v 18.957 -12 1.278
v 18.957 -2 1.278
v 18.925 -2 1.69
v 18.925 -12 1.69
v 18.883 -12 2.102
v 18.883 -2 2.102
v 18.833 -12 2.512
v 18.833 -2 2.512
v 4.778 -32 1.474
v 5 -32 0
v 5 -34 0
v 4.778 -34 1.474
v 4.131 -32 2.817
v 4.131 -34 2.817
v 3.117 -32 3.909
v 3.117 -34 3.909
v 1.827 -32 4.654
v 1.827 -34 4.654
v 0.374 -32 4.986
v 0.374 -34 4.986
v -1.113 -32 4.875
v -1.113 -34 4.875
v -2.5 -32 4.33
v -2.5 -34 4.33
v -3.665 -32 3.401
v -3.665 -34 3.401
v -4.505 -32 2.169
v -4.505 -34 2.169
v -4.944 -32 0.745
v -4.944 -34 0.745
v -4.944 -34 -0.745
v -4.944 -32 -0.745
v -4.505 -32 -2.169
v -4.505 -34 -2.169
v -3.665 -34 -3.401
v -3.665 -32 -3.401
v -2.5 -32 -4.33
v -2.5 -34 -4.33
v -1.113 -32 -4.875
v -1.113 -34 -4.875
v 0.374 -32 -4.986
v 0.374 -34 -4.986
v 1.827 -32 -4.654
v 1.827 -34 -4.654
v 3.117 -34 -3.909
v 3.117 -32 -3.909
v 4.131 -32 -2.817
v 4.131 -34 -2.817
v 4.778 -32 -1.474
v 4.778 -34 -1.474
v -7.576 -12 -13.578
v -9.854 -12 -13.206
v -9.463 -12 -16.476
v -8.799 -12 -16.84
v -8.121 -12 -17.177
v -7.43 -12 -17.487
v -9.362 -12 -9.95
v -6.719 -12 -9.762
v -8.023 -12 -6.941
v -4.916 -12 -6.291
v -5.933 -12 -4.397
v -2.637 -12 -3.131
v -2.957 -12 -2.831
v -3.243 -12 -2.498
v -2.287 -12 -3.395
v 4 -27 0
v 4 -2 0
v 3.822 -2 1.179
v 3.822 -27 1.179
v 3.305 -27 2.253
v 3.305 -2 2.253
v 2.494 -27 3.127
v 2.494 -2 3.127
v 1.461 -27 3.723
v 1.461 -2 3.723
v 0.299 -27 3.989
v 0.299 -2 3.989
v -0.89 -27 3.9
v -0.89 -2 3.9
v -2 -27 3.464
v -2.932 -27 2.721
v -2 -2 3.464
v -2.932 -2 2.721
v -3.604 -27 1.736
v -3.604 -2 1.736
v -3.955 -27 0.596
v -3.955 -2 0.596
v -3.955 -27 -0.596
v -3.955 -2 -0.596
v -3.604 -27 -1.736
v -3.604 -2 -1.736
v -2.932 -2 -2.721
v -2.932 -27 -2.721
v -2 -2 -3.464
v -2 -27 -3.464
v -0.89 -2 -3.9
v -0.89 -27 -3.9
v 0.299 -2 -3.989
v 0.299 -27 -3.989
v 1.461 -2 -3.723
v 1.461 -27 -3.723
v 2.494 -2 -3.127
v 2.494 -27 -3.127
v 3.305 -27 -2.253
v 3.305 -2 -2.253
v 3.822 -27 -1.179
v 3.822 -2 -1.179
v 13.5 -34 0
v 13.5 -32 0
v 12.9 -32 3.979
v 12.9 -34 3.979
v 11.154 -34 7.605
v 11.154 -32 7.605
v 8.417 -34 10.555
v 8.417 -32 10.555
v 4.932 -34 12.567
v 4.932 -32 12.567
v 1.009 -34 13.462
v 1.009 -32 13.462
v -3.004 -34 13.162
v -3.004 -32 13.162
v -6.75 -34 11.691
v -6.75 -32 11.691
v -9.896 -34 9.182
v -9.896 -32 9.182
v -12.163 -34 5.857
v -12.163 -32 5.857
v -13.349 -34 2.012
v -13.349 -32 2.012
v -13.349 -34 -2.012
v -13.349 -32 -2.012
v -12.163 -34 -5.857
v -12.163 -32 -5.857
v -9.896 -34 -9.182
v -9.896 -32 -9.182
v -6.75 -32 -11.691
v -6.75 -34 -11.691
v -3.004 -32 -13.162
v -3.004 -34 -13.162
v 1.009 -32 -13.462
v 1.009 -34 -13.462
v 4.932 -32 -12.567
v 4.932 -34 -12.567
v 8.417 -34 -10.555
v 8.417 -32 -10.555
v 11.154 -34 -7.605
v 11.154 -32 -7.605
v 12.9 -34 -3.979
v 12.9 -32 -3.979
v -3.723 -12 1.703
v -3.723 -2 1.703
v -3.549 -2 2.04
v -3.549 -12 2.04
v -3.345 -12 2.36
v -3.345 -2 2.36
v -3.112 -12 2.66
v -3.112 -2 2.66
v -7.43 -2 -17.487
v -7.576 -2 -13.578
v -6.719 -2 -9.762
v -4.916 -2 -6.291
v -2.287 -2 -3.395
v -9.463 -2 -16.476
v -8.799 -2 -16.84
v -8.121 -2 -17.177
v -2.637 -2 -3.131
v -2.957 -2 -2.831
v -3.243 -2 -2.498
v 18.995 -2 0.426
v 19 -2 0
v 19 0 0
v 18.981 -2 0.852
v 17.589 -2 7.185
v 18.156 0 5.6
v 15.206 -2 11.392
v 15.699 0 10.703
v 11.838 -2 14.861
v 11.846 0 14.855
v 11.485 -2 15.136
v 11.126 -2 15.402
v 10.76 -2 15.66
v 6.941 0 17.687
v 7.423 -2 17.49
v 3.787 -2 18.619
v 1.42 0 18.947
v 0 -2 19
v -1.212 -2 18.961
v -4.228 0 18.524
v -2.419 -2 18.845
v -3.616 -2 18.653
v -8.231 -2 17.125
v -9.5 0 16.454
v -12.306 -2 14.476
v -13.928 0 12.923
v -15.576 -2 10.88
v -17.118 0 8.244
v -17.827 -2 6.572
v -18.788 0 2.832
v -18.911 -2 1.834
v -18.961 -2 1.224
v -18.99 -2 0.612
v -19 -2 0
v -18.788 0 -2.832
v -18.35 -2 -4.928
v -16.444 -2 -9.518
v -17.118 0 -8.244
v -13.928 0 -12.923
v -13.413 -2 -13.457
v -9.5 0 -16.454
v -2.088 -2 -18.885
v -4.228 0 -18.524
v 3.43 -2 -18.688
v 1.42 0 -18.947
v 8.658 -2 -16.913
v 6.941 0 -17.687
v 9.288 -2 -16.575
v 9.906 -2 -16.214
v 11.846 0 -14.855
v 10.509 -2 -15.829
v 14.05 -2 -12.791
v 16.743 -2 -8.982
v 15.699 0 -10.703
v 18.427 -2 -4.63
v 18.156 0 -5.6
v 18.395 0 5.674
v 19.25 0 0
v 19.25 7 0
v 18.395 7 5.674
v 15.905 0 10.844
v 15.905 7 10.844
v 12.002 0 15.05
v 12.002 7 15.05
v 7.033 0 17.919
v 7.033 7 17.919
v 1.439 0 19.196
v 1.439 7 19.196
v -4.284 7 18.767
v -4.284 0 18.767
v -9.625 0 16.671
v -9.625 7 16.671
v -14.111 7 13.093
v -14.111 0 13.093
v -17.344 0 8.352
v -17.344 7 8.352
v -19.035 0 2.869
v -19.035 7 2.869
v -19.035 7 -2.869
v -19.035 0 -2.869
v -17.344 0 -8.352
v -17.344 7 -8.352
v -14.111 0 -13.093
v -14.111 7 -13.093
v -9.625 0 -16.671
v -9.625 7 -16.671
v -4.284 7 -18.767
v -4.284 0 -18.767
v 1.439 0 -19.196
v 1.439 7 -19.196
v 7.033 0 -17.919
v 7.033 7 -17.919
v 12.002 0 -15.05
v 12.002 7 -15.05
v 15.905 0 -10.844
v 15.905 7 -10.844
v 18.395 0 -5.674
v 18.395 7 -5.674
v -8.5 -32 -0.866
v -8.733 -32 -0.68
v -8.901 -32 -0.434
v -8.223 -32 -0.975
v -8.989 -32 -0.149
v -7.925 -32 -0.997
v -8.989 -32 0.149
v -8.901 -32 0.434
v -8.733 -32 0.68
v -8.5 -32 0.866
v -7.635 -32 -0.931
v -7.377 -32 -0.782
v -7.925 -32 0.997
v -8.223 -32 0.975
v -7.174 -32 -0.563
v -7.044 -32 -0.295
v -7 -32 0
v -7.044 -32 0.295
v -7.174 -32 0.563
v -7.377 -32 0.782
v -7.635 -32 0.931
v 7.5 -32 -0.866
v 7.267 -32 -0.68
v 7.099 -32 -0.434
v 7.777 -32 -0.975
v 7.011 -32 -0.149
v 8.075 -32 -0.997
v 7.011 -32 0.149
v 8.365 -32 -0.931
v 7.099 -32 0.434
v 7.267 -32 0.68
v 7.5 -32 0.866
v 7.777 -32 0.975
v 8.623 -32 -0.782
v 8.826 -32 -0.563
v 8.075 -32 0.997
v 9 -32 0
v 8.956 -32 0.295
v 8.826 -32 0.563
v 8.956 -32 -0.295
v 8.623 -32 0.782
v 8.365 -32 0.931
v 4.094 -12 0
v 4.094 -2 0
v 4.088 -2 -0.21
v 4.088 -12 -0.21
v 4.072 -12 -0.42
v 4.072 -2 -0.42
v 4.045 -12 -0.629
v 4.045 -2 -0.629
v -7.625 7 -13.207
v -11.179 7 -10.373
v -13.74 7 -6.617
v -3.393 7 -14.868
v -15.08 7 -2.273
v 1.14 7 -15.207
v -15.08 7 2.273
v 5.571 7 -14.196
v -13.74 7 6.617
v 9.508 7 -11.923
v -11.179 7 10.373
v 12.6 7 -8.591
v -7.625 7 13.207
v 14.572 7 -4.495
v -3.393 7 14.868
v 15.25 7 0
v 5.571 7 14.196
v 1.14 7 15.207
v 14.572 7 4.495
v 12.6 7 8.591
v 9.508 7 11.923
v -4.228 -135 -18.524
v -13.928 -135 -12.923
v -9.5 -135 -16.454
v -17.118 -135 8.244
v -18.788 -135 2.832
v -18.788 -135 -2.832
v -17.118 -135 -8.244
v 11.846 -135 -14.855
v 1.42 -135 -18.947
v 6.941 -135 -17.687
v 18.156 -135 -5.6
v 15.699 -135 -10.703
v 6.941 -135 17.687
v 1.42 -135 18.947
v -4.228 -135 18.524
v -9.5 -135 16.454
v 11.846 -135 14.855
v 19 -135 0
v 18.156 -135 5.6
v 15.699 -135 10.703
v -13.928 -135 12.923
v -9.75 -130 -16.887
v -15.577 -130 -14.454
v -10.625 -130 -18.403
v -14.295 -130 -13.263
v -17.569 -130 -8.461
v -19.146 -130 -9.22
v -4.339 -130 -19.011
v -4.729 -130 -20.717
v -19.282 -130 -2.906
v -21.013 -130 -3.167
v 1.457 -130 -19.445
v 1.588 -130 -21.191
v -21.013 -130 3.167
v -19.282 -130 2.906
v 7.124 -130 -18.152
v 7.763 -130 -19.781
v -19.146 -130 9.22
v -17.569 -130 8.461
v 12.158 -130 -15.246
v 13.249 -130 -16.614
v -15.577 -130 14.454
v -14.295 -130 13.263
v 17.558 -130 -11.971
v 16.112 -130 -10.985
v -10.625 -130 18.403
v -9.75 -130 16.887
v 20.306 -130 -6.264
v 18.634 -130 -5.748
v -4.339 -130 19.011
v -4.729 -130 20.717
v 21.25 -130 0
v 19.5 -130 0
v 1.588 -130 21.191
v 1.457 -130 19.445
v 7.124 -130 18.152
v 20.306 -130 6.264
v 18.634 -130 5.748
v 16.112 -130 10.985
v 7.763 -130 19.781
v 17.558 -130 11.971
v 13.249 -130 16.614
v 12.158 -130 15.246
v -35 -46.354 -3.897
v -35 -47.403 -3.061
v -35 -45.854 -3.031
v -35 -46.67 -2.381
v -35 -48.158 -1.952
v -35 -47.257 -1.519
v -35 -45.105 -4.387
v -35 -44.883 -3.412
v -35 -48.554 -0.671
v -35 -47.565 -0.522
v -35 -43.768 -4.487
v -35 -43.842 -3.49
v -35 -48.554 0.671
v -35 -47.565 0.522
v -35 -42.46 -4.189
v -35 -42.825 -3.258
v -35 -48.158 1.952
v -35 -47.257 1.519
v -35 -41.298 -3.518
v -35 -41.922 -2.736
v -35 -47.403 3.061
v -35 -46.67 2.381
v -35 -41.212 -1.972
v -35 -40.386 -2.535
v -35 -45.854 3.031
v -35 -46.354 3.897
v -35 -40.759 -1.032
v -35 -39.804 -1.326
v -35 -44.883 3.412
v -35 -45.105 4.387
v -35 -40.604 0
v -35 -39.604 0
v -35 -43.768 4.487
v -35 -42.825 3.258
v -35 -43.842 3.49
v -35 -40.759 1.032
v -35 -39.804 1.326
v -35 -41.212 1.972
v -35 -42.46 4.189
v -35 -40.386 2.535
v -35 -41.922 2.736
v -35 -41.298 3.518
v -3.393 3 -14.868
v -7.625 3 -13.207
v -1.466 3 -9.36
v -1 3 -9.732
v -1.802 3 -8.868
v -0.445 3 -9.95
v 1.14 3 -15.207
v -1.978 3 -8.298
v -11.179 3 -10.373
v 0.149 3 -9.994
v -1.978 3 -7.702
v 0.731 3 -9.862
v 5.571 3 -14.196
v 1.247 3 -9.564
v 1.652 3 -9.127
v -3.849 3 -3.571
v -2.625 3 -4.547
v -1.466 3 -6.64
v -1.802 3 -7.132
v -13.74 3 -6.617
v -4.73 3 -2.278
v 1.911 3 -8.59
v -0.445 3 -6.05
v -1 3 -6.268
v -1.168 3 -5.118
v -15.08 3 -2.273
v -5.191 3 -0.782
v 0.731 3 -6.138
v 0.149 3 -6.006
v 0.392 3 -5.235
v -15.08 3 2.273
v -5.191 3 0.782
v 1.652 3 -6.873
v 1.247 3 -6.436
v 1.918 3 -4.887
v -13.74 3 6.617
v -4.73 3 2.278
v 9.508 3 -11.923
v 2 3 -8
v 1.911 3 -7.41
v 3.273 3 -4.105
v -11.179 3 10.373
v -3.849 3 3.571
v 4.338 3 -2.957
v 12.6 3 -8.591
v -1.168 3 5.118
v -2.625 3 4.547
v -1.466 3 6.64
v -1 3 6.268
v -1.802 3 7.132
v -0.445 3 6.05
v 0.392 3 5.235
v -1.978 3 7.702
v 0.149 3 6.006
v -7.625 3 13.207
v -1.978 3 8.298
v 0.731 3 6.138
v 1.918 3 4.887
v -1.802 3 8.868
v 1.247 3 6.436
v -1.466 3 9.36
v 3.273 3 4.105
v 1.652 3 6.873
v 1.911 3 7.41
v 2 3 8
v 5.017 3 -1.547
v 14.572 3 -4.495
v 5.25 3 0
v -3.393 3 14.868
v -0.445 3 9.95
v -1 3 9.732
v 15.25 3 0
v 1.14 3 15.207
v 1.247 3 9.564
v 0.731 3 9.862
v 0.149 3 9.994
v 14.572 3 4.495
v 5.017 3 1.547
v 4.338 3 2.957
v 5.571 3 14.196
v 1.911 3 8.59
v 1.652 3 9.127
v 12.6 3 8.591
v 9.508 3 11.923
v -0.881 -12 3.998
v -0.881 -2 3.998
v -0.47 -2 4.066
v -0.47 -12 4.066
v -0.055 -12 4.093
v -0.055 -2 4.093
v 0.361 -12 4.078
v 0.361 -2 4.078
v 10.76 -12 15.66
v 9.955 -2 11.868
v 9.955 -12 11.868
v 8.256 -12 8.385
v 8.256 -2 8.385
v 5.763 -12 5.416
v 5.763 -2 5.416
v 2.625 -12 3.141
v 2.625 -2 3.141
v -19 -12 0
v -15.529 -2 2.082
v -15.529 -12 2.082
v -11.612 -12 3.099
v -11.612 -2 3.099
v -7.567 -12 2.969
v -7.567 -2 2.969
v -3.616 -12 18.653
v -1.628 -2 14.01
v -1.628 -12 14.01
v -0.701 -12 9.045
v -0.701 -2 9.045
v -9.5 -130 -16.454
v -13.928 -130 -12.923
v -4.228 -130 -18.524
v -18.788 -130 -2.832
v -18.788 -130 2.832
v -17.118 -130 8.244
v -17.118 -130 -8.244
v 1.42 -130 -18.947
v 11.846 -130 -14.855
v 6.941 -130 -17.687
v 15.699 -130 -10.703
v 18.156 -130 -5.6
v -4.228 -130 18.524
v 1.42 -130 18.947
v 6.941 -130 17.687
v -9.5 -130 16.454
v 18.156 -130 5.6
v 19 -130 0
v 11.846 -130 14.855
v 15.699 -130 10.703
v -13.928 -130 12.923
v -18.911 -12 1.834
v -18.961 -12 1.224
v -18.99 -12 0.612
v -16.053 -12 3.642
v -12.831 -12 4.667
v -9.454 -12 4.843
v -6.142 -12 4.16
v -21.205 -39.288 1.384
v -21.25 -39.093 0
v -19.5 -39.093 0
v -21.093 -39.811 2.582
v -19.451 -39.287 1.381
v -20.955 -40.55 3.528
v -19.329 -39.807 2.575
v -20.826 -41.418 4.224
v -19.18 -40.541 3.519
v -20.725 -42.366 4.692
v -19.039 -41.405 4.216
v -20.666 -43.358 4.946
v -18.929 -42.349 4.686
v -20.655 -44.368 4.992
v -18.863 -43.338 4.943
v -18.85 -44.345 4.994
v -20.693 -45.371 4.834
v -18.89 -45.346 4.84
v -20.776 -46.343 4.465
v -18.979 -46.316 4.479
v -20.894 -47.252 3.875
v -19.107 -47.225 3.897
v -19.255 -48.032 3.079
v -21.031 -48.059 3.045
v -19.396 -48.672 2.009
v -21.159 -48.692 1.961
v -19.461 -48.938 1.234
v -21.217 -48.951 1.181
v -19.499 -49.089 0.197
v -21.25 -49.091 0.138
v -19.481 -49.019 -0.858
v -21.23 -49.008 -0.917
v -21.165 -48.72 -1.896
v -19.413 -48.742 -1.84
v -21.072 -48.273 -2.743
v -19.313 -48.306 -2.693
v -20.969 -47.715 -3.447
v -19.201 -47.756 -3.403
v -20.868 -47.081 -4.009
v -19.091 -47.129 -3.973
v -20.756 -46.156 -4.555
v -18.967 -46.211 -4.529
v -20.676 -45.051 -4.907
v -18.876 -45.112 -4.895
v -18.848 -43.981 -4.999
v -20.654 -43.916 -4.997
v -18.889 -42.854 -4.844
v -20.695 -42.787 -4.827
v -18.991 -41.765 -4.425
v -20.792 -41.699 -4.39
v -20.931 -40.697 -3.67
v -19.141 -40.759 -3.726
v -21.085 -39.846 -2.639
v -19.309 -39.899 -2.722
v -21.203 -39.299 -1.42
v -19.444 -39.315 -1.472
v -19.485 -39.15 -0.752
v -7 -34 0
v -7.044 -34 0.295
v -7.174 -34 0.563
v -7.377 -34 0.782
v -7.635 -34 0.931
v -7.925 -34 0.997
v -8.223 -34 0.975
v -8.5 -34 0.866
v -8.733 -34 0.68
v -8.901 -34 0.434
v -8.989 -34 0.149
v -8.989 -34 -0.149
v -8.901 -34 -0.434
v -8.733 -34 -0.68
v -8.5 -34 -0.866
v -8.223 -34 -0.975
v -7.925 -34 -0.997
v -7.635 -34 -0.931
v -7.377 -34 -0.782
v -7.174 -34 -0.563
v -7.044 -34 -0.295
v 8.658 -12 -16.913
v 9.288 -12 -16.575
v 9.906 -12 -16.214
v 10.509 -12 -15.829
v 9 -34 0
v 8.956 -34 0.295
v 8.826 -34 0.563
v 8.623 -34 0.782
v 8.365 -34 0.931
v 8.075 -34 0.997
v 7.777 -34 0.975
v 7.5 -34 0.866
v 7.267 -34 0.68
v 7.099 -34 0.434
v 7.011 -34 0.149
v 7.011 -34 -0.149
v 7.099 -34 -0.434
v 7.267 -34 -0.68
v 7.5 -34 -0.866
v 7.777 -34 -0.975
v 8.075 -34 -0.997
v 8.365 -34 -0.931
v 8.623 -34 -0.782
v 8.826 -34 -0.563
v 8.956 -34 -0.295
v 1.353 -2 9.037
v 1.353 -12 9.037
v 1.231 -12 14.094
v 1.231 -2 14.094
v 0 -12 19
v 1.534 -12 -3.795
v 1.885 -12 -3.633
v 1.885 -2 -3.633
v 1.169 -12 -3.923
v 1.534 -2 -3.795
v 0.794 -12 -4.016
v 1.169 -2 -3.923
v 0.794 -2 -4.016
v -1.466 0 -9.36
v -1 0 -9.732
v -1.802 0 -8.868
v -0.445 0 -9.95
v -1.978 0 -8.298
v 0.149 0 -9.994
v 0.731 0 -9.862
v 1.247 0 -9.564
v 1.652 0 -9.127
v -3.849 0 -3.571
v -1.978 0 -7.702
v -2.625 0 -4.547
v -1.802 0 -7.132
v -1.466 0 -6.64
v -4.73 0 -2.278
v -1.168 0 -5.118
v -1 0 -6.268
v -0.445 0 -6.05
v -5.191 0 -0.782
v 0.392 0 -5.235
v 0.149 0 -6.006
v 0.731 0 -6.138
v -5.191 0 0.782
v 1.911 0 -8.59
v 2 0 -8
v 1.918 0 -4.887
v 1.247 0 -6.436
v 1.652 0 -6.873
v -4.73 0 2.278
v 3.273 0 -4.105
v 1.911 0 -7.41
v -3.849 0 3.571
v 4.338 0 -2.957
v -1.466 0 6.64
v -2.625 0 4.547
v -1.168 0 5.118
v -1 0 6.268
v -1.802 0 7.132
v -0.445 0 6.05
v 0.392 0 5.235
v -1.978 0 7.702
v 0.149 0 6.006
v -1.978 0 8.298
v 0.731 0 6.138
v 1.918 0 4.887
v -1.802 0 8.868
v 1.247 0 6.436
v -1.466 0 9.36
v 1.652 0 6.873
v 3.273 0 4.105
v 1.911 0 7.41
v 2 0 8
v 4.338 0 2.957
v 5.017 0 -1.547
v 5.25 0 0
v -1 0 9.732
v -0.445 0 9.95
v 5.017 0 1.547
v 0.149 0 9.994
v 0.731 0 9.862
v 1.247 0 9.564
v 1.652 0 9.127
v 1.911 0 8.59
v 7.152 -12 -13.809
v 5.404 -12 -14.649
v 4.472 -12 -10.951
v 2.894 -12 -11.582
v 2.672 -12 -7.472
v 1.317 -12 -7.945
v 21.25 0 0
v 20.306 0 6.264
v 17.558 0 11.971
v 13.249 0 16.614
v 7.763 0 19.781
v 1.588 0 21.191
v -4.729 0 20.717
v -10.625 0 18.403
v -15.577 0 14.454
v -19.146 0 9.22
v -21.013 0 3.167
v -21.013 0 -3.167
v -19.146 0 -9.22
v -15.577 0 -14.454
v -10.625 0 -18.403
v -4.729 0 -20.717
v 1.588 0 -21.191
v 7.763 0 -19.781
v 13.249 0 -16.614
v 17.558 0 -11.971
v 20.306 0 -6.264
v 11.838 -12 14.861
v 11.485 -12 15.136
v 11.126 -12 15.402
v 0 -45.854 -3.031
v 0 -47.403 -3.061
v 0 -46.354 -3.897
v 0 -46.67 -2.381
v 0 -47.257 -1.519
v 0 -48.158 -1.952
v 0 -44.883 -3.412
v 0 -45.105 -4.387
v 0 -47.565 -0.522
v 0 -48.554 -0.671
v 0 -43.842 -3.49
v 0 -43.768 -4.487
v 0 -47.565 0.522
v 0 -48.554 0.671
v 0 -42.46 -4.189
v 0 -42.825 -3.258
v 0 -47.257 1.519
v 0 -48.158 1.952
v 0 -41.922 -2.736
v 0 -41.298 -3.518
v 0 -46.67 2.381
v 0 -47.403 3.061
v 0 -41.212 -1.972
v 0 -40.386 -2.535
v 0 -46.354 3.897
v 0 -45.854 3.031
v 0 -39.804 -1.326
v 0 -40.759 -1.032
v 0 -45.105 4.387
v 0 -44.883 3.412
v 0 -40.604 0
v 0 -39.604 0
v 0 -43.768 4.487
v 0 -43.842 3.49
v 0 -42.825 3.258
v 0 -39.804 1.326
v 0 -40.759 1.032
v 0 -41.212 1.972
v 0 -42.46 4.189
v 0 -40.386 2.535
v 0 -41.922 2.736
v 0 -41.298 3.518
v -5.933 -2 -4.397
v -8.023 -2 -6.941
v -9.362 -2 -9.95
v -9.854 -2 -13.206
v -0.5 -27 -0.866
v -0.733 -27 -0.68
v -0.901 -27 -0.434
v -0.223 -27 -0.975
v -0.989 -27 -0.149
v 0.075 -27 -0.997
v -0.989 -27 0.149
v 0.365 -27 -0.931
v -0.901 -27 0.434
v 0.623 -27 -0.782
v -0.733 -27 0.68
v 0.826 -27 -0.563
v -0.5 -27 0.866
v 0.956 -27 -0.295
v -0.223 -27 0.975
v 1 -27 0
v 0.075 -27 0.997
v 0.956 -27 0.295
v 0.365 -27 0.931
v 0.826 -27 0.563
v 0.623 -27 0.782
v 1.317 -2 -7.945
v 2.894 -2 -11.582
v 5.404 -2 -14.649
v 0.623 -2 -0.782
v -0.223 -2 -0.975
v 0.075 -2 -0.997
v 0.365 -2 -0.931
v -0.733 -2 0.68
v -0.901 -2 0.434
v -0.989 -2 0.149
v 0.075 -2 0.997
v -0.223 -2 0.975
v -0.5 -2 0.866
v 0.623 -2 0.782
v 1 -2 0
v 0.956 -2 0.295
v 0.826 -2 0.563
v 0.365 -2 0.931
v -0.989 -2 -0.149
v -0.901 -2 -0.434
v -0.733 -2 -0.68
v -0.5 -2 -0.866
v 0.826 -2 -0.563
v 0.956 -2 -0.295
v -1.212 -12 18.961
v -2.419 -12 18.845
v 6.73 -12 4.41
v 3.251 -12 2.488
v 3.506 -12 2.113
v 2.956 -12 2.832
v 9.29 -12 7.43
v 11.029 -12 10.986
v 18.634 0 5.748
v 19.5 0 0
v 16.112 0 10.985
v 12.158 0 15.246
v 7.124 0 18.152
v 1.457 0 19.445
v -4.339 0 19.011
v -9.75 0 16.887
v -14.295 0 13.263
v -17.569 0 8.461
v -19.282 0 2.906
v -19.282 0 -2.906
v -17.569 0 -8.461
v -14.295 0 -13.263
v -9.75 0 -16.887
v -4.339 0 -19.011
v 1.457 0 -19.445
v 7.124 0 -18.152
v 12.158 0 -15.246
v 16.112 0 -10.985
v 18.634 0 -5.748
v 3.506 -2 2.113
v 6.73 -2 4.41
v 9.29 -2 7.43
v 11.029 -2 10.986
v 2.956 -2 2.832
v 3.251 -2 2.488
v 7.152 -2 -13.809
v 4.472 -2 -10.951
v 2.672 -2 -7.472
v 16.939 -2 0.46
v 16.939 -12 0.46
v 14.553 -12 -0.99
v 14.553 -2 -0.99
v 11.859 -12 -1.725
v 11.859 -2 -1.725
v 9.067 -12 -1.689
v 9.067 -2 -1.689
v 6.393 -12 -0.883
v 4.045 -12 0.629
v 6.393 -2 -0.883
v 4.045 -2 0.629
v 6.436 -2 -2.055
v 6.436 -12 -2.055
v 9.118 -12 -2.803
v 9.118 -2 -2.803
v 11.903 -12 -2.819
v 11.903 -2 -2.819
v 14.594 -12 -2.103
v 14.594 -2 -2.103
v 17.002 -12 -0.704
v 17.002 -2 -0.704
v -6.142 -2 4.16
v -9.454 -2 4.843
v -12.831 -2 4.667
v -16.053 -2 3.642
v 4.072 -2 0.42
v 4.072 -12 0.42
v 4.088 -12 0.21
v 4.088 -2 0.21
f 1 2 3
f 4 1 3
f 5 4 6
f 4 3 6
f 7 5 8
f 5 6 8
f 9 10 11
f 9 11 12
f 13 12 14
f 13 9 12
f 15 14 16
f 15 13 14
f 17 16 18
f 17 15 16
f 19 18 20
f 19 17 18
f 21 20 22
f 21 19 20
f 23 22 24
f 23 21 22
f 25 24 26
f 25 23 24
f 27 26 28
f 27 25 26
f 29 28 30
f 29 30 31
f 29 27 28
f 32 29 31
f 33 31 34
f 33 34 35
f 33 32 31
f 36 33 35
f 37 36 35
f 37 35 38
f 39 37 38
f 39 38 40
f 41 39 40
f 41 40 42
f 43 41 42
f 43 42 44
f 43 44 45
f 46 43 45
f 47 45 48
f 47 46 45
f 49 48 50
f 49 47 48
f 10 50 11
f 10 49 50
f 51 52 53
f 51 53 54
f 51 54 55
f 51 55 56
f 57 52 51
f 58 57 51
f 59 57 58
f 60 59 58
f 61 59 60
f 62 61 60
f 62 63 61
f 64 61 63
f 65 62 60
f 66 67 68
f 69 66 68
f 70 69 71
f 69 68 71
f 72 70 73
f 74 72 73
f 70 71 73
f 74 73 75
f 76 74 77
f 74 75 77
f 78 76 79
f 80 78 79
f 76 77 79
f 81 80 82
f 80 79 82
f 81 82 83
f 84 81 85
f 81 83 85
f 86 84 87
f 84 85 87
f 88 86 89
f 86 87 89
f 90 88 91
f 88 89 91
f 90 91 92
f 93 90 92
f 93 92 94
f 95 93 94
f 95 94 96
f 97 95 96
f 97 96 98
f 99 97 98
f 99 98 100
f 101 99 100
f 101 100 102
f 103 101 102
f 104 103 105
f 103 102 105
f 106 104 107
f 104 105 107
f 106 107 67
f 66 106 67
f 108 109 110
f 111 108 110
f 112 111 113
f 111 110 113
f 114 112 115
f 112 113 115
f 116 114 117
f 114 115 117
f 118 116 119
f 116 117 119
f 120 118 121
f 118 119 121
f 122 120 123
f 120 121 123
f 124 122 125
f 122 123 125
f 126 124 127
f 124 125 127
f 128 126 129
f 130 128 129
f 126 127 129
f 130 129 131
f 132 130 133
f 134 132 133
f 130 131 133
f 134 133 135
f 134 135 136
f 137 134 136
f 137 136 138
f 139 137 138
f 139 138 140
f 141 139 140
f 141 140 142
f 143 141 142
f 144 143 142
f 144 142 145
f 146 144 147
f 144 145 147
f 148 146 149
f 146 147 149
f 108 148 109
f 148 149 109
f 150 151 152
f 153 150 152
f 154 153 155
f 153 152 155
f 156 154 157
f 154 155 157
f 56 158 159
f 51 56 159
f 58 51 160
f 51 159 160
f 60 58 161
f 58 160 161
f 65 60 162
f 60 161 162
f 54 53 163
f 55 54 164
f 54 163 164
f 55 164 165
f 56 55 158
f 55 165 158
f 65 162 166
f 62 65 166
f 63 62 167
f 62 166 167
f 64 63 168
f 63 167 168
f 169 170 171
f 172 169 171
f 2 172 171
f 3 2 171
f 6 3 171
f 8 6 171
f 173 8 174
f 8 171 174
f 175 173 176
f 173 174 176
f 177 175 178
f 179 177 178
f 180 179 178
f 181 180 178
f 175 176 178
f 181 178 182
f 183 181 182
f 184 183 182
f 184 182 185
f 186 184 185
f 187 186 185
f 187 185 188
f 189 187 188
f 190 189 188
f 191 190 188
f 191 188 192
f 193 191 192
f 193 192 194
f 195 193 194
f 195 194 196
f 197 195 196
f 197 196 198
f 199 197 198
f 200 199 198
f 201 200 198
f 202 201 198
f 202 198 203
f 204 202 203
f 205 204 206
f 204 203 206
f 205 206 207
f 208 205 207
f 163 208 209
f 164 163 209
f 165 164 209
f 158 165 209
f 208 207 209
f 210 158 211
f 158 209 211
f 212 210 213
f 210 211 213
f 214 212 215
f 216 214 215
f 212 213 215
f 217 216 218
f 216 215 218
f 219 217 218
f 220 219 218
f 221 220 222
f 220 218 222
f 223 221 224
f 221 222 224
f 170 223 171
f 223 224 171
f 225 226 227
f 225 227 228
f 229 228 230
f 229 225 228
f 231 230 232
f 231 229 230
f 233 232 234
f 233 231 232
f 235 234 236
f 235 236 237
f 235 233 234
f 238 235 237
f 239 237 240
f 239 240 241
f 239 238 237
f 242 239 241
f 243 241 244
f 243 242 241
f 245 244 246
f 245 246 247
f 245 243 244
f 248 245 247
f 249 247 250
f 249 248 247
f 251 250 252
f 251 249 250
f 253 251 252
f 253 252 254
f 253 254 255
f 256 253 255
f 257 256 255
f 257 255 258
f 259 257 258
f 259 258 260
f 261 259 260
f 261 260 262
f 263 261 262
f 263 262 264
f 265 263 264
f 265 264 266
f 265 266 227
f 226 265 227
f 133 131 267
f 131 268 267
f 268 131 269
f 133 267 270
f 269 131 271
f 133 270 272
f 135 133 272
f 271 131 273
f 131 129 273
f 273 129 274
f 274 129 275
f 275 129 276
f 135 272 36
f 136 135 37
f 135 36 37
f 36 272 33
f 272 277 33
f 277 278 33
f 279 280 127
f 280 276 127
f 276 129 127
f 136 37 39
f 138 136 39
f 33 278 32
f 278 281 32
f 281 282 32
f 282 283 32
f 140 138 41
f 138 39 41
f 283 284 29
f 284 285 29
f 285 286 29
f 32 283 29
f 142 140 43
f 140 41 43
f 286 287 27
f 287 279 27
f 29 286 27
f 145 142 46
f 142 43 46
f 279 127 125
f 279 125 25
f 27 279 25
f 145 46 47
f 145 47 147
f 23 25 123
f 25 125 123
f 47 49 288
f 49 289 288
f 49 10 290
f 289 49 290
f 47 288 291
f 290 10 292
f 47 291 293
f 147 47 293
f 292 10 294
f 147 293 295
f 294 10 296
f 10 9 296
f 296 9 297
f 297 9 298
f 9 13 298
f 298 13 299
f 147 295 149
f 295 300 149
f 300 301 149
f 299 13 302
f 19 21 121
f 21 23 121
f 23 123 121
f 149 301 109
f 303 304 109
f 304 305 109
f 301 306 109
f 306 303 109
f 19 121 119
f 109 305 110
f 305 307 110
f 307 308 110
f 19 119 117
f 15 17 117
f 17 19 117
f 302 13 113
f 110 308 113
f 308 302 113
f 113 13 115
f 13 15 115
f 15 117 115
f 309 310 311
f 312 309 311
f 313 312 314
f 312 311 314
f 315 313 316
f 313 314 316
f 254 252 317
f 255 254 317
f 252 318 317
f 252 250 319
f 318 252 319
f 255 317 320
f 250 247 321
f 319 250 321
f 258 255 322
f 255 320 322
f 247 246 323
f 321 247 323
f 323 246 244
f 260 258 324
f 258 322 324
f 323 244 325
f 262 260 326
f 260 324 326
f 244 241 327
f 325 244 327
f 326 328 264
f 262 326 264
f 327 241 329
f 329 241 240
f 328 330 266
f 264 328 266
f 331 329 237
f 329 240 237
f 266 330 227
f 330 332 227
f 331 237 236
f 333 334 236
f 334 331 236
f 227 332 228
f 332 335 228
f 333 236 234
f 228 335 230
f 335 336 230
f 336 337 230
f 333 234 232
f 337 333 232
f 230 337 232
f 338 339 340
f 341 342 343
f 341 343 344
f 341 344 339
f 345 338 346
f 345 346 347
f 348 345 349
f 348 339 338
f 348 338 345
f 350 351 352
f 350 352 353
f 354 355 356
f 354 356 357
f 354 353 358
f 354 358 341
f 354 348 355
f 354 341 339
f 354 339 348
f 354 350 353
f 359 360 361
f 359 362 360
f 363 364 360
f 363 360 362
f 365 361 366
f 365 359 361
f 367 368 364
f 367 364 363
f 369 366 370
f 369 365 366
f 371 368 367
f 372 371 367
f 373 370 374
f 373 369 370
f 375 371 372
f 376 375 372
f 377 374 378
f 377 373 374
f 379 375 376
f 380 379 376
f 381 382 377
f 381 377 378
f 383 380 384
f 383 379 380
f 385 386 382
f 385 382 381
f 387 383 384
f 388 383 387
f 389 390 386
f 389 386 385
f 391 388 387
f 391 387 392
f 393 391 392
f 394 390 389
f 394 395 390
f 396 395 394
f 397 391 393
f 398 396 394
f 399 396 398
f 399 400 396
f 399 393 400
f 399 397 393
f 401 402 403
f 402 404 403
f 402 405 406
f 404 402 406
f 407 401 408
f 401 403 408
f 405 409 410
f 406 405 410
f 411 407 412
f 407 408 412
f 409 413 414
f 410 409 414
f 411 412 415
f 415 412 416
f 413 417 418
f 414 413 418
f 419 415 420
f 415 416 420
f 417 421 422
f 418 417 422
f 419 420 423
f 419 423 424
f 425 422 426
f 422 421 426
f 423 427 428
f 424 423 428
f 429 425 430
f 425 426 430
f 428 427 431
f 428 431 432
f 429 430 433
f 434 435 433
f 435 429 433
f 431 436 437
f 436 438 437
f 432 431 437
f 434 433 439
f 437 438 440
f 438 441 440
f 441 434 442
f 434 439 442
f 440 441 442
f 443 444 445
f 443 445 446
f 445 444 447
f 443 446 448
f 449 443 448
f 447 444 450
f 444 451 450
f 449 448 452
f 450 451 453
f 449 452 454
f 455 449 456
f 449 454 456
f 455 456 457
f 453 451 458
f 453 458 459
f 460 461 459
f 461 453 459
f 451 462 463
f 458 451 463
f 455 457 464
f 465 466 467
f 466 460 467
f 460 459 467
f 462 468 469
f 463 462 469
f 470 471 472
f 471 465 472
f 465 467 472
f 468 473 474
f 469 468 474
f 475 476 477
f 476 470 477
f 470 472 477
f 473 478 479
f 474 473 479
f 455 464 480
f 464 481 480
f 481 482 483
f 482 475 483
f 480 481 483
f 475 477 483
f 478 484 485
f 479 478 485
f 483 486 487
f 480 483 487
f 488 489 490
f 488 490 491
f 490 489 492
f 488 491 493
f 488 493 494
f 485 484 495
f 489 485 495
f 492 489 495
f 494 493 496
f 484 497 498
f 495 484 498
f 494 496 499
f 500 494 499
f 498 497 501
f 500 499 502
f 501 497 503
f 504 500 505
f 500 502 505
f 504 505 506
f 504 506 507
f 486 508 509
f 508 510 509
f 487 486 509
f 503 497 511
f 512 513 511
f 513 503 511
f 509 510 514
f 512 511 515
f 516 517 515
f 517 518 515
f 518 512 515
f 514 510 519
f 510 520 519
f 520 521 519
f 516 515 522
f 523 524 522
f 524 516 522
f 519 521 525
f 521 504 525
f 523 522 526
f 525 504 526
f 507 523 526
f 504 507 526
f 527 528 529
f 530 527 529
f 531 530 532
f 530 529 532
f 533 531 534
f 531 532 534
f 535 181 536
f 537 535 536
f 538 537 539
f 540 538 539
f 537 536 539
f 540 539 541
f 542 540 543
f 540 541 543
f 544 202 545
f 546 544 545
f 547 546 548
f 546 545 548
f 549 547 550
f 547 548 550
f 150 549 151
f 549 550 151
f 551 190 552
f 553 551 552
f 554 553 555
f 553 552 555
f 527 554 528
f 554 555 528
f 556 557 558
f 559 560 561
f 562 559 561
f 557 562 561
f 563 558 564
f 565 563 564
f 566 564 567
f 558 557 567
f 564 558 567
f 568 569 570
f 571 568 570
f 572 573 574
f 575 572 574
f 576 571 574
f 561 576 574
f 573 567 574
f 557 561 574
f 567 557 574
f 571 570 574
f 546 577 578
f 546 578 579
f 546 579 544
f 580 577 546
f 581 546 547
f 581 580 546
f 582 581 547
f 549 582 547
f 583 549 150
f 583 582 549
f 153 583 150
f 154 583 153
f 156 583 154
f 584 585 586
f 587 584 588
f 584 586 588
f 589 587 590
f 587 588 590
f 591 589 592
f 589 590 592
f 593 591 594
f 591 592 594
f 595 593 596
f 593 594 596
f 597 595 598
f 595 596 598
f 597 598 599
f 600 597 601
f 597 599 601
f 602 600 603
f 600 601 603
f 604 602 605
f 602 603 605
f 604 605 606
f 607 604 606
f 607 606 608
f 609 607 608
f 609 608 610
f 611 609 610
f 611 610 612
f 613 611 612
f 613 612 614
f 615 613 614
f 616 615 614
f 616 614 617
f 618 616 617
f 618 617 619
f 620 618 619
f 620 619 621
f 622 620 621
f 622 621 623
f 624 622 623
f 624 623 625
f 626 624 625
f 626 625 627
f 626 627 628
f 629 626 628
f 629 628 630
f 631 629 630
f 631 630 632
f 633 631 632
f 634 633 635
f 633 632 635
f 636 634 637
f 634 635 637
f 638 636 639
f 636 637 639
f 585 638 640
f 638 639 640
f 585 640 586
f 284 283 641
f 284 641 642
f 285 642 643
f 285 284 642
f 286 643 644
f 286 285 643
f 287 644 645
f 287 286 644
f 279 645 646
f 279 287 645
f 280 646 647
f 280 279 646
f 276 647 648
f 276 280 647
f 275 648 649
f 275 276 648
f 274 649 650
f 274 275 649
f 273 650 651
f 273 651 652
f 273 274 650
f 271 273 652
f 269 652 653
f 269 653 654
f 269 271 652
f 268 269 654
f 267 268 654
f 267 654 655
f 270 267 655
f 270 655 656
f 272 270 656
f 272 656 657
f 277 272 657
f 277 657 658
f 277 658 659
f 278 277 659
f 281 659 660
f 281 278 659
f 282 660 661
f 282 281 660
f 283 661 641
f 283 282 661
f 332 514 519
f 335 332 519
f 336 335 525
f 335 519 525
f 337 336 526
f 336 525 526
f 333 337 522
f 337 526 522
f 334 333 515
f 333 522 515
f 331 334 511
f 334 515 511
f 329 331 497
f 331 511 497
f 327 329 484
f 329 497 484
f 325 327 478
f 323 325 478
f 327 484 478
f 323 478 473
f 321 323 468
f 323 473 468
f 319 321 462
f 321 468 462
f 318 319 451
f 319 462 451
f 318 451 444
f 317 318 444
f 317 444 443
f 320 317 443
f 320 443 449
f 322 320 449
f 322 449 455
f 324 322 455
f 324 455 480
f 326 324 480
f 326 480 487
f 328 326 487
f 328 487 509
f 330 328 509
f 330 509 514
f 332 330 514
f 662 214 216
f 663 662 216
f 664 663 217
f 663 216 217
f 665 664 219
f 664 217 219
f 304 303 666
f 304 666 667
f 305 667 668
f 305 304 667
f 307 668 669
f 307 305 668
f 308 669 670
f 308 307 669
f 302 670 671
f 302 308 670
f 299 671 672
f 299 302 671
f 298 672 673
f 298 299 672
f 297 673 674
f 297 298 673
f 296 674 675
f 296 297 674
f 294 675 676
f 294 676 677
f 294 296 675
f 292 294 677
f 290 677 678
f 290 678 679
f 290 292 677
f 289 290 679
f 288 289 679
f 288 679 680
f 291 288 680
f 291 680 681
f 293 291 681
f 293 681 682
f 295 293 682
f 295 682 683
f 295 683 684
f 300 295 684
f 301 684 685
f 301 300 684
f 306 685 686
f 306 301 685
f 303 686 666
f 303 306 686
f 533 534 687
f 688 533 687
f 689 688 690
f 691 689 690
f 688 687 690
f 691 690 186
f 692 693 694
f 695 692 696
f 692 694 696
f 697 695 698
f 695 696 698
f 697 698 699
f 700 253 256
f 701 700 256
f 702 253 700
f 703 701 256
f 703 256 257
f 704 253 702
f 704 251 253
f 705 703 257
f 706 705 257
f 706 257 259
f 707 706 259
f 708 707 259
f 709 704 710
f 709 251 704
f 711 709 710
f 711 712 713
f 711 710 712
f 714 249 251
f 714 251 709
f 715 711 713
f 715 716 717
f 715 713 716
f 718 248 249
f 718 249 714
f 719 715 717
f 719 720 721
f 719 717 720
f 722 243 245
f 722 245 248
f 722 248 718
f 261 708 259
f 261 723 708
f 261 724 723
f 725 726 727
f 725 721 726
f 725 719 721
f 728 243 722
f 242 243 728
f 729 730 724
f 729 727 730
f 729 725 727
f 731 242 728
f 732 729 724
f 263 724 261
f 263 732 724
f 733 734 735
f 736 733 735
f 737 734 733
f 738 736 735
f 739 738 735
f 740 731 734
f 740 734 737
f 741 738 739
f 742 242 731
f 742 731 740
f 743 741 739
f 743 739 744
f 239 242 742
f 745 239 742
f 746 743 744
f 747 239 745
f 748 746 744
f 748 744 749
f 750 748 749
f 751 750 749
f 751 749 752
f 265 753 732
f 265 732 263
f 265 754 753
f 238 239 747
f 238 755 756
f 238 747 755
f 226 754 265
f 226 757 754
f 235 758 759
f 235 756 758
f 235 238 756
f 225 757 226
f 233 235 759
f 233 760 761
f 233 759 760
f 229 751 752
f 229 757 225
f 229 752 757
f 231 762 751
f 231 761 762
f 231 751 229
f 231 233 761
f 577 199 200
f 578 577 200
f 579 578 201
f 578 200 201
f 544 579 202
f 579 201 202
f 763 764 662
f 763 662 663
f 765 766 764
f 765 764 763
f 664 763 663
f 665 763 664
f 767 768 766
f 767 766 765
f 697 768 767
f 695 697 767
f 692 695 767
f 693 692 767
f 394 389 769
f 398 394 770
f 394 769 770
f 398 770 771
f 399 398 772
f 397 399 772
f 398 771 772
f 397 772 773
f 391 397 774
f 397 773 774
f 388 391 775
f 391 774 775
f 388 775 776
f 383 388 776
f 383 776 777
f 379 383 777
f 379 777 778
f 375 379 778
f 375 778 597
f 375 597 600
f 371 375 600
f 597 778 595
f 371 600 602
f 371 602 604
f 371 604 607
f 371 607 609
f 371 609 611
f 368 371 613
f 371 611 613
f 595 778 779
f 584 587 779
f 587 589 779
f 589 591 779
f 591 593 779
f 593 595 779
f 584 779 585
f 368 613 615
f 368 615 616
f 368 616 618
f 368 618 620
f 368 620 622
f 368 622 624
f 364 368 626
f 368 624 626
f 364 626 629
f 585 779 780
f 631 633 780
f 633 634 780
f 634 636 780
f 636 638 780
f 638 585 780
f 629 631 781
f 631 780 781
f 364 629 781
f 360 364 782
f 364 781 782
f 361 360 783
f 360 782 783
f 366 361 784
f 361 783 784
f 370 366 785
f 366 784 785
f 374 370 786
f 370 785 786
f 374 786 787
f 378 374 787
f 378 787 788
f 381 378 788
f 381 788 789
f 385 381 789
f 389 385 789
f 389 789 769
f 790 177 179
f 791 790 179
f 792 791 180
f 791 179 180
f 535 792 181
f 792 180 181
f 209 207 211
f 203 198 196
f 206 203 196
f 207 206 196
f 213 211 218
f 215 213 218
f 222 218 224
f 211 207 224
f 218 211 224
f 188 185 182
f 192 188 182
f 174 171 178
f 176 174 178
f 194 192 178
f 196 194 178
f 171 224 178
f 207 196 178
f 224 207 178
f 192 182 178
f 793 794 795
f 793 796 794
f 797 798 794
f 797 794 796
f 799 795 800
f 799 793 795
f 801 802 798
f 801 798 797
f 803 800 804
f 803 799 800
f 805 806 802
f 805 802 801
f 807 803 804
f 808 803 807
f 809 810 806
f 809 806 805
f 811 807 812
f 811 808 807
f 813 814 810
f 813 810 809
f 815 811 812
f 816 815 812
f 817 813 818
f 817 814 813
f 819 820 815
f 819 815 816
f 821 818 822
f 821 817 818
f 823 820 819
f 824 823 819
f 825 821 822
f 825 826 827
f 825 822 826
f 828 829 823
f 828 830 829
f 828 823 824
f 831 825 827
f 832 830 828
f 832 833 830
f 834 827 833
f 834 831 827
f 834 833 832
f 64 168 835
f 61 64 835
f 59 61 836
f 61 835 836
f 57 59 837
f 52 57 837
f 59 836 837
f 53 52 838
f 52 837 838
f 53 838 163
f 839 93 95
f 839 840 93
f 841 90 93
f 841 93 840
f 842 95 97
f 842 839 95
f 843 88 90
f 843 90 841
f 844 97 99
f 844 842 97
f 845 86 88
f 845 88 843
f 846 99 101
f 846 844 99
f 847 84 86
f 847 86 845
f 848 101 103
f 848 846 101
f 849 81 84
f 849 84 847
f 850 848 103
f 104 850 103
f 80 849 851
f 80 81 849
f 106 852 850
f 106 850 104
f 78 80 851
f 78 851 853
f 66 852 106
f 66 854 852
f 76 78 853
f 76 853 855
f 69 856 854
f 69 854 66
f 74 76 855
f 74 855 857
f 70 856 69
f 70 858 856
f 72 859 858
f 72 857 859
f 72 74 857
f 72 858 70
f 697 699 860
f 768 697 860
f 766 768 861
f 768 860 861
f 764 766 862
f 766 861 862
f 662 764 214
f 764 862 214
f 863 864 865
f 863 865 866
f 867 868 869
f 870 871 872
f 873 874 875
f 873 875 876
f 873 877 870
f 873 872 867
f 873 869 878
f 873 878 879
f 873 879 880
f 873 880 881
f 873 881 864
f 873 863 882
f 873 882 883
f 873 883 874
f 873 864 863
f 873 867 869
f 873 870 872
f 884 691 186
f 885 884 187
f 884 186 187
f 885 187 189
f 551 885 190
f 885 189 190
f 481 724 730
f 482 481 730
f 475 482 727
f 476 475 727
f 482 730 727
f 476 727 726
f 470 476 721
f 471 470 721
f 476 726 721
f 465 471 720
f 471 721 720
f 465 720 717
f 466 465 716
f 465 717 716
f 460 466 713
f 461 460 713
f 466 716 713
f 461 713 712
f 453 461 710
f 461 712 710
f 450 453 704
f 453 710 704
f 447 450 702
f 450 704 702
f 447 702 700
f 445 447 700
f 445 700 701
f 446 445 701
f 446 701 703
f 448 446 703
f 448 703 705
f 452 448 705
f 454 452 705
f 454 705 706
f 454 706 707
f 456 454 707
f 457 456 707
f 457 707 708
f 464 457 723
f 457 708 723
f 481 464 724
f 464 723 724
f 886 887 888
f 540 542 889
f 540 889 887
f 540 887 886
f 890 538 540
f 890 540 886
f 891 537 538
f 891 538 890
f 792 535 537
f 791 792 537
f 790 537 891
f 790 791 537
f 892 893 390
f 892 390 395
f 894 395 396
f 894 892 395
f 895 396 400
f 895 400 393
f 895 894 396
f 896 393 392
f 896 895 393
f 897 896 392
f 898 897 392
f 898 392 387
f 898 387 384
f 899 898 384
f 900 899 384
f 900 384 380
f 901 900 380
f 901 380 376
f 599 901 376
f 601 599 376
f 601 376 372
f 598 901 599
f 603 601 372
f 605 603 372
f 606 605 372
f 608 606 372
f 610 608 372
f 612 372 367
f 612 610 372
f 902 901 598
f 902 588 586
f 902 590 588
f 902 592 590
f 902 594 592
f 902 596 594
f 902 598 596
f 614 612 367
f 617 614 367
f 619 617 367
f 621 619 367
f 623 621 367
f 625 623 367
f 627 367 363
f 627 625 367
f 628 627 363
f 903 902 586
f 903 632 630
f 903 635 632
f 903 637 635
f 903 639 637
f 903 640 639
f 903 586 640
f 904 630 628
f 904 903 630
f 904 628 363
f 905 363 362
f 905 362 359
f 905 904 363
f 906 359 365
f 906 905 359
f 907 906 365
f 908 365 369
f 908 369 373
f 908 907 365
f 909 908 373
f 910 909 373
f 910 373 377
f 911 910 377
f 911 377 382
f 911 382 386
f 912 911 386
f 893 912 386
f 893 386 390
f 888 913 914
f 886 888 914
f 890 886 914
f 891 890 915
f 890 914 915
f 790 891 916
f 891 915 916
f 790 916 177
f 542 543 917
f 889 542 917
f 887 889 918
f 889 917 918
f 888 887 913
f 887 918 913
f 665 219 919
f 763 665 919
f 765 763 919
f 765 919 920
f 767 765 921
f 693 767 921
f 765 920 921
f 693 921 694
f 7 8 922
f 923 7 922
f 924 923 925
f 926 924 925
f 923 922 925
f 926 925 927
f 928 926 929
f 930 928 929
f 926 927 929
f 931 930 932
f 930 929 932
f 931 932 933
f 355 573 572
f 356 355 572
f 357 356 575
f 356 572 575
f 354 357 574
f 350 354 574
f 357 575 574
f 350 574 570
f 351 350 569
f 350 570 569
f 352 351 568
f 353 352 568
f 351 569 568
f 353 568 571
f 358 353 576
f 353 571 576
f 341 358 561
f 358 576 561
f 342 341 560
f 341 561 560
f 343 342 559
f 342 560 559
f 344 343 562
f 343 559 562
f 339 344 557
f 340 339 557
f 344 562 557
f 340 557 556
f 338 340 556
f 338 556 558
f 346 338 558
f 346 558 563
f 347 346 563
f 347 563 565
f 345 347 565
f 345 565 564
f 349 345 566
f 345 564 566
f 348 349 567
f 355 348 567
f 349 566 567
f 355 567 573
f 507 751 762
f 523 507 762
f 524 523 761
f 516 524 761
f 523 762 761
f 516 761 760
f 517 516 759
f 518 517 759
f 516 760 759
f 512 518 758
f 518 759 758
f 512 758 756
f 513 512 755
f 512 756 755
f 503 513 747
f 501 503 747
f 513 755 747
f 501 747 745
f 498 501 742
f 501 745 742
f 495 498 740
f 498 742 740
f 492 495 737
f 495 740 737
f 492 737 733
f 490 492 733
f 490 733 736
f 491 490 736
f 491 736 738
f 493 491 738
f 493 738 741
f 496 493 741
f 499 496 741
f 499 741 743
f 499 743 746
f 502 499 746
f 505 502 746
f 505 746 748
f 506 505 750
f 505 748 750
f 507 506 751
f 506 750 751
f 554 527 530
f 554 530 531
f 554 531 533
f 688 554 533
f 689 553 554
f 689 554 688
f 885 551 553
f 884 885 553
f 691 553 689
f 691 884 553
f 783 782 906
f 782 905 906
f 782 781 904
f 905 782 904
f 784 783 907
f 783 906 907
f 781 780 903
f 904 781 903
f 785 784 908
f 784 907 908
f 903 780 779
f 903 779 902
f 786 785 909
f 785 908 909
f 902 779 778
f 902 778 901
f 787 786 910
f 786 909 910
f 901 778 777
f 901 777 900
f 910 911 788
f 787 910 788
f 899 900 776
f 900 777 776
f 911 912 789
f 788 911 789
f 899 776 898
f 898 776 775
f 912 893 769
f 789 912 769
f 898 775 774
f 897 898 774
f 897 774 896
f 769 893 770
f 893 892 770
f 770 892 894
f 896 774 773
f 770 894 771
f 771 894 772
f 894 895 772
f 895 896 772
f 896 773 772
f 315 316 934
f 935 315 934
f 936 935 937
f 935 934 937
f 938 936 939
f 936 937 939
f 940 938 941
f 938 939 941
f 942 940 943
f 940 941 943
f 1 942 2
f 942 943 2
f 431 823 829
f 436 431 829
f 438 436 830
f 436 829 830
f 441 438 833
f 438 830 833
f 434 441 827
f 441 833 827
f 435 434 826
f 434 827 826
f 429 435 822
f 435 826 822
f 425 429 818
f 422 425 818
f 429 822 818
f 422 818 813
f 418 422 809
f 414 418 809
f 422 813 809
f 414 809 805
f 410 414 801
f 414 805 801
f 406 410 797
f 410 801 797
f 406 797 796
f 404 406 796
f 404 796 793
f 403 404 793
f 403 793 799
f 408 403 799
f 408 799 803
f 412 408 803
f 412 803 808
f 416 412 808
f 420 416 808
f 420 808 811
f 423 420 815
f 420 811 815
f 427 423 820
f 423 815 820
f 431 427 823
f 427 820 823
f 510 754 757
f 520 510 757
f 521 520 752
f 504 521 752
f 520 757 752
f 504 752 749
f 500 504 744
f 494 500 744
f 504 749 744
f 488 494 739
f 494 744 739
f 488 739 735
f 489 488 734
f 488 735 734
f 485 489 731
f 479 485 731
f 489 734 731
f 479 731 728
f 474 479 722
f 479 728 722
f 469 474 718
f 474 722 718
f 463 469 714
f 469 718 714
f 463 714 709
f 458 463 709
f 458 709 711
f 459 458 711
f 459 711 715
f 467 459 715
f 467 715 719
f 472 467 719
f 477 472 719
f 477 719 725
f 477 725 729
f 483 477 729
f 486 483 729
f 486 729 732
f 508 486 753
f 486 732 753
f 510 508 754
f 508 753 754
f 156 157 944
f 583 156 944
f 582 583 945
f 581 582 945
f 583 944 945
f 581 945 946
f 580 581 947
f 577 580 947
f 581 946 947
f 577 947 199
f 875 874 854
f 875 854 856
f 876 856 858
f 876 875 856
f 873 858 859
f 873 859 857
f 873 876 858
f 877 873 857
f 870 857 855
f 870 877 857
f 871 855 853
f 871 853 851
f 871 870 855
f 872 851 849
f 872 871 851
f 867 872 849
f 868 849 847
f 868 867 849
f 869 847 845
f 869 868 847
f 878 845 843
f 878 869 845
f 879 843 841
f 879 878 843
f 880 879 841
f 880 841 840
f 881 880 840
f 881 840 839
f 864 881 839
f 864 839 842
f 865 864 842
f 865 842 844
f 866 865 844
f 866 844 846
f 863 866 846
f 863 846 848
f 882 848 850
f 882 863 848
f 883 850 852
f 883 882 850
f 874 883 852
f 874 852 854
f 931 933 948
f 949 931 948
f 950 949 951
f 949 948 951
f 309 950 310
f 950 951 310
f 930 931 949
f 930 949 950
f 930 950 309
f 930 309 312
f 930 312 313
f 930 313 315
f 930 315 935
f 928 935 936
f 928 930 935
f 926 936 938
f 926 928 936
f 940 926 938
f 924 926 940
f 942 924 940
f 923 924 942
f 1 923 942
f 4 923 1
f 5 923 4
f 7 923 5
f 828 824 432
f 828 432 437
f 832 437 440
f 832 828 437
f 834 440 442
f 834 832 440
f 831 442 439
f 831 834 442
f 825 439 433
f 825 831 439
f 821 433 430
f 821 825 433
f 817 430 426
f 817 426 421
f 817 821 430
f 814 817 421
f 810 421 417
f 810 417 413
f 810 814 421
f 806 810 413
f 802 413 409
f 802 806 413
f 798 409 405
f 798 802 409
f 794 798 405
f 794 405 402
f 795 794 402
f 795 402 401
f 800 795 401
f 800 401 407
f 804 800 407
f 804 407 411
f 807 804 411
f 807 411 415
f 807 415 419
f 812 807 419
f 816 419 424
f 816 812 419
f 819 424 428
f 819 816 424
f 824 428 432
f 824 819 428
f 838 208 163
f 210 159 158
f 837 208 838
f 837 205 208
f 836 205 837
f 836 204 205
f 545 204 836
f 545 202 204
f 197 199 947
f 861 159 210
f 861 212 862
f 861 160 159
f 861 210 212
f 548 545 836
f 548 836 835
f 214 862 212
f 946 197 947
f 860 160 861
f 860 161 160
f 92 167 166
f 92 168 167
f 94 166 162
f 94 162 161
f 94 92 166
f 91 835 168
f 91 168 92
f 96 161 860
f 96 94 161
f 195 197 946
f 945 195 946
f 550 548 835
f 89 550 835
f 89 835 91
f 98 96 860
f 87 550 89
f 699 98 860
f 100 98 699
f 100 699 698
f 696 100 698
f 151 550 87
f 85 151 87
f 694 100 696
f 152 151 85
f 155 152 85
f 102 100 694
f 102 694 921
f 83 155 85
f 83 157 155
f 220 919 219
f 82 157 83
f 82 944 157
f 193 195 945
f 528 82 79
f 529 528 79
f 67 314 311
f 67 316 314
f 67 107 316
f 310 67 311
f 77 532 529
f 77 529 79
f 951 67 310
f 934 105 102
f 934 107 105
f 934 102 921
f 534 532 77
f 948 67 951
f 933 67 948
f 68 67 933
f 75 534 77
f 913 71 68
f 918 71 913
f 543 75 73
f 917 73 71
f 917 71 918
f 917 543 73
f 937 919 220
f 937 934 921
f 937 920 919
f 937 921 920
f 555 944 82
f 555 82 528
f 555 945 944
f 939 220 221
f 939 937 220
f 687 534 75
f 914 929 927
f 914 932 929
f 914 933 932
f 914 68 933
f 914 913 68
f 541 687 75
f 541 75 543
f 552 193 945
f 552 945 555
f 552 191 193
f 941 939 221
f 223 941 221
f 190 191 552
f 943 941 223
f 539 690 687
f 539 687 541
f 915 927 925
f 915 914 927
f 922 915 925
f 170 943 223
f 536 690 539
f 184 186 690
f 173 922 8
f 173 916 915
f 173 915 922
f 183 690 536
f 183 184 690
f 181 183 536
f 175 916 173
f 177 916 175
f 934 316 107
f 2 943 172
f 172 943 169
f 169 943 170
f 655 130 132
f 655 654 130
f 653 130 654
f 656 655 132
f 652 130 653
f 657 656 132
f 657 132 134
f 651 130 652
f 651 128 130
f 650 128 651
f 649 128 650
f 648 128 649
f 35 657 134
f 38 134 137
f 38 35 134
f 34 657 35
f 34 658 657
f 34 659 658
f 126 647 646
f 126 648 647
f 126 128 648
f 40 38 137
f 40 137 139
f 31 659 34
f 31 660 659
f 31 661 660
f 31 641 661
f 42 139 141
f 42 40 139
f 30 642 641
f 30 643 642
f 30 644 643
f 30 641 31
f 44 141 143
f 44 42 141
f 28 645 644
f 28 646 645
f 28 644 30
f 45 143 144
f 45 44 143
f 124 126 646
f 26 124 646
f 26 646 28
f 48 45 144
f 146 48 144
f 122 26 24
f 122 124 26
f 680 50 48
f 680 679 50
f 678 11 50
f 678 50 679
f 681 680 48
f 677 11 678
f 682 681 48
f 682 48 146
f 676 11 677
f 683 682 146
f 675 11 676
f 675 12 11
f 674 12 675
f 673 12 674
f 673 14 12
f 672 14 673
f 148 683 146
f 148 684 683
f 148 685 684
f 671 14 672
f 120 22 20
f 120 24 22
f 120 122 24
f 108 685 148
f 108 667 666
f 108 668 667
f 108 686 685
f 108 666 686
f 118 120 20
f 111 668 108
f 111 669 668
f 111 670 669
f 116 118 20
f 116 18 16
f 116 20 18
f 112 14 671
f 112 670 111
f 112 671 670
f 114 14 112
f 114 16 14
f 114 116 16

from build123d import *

# Parameters (mm, degrees)
F0_R      = 21.25
F0_R_2    = 19.5
F1_DEPTH  = 130
F2_R      = 19
F3_DEPTH  = 2
F5_DEPTH  = 10
F6_R      = 4
F6_R_2    = 1
F7_DEPTH  = 25
F9_R      = 13.5
F9_R_2    = 1
F9_R_3    = 5
F10_DEPTH = 2
F11_R     = 19
F12_DEPTH = 5
F14_R     = 19.25
F14_R_2   = 15.25
F15_DEPTH = 7
F13_R     = 19.25
F13_R_2   = 2
F13_R_3   = 5.25
F16_DEPTH = 3
F17_R     = 5
F18_DEPTH = 25
F19_R     = 4.5
F19_R_2   = 3.5
F20_DEPTH = 35


with BuildPart() as f1:
    # F0 (on Front) → F1 (new body)
    with BuildSketch(Plane.XZ):
        Circle(F0_R)
        Circle(F0_R_2, mode=Mode.SUBTRACT)
    extrude(amount=F1_DEPTH)

    # F17 (on Right) → F18 (cut)
    with BuildSketch(Plane.YZ):
        with Locations((-44.0929981836, 0)):
            Circle(F17_R)
    extrude(amount=-F18_DEPTH, mode=Mode.SUBTRACT)


with BuildPart() as f3:
    # F2 (on Front) → F3 (new body)
    with BuildSketch(Plane.XZ):
        Circle(F2_R)
    extrude(amount=F3_DEPTH)

    # F4 (on face) → F5 (join)
    with BuildSketch(Plane.XZ.offset(2)):
        with BuildLine():
            ThreePointArc((-0.8807426938, 3.9976556624), (-0.262972184, 4.0850708829), (0.3609074471, 4.0775855972))
            ThreePointArc((0.3609074471, 4.0775855972), (1.4318761863, 11.5690591934), (0, 19))
            ThreePointArc((0, 19), (-1.8165448197, 18.9129628805), (-3.6164468153, 18.6526489387))
            ThreePointArc((-3.6164468153, 18.6526489387), (-1.0279648452, 11.5530119939), (-0.8807426938, 3.9976556624))
        make_face()
        with BuildLine():
            ThreePointArc((4.0449890987, 0.6285075012), (4.0813740456, 0.3151894469), (4.0935264122, 0))
            ThreePointArc((4.0935264122, 0), (4.0813740456, -0.3151894469), (4.0449890987, -0.6285075012))
            ThreePointArc((4.0449890987, -0.6285075012), (11.9029156585, -2.8191622482), (18.9569742559, 1.2779385979))
            ThreePointArc((18.9569742559, 1.2779385979), (18.9051408531, 1.8962197457), (18.8331476428, 2.5124788283))
            ThreePointArc((18.8331476428, 2.5124788283), (11.8589063351, -1.7250083592), (4.0449890987, 0.6285075012))
        make_face()
        with BuildLine():
            ThreePointArc((10.5086804094, -15.8293283513), (4.472463586, -10.9507893463), (1.885499087, -3.6334352451))
            ThreePointArc((1.885499087, -3.6334352451), (1.3532147662, -3.8633881871), (0.7937800824, -4.0158276443))
            ThreePointArc((0.7937800824, -4.0158276443), (2.8936148094, -11.5815369143), (8.6579913708, -16.9126930269))
            ThreePointArc((8.6579913708, -16.9126930269), (9.5986325347, -16.3971416248), (10.5086804094, -15.8293283513))
        make_face()
        with BuildLine():
            ThreePointArc((-7.4296387756, -17.4871515023), (-6.7193868126, -9.7619546431), (-2.2869349367, -3.3951269612))
            ThreePointArc((-2.2869349367, -3.3951269612), (-2.8010234372, -2.9851676991), (-3.2428415122, -2.4981868254))
            ThreePointArc((-3.2428415122, -2.4981868254), (-8.7938159938, -8.4006512862), (-9.46341018, -16.4755536406))
            ThreePointArc((-9.46341018, -16.4755536406), (-8.4616551757, -17.0117721501), (-7.4296387756, -17.4871515023))
        make_face()
        with BuildLine():
            ThreePointArc((2.625124981, 3.1409675773), (3.1082414751, 2.6637930513), (3.5058292586, 2.1133195918))
            ThreePointArc((3.5058292586, 2.1133195918), (9.2901266507, 7.4295802077), (11.8384676733, 14.8610458295))
            ThreePointArc((11.8384676733, 14.8610458295), (11.3062223328, 15.2698833185), (10.7598697961, 15.6596680032))
            ThreePointArc((10.7598697961, 15.6596680032), (8.2557551999, 8.3845012164), (2.625124981, 3.1409675773))
        make_face()
        with BuildLine():
            ThreePointArc((-3.7226537591, 1.7025884639), (-3.4504927386, 2.202511827), (-3.1116166062, 2.6598497295))
            ThreePointArc((-3.1116166062, 2.6598497295), (-11.1480898399, 4.8633482334), (-18.9112303054, 1.8344940269))
            ThreePointArc((-18.9112303054, 1.8344940269), (-18.9777946006, 0.9183202591), (-19, 0))
            ThreePointArc((-19, 0), (-11.6118635943, 3.0993631098), (-3.7226537591, 1.7025884639))
        make_face()
    extrude(amount=F5_DEPTH)

    # F6 (on face) → F7 (join)
    with BuildSketch(Plane.XZ.offset(2)):
        Circle(F6_R)
        Circle(F6_R_2, mode=Mode.SUBTRACT)
    extrude(amount=F7_DEPTH)


with BuildPart() as f10:
    # F9 (on offset) → F10 (new body)
    with BuildSketch(Plane.XZ.offset(32)):
        Circle(F9_R)
        with Locations((-8, 0)):
            Circle(F9_R_2, mode=Mode.SUBTRACT)
        Circle(F9_R_3, mode=Mode.SUBTRACT)
        with Locations((8, 0)):
            Circle(F9_R_2, mode=Mode.SUBTRACT)
    extrude(amount=F10_DEPTH)


with BuildPart() as f12:
    # F11 (on face) → F12 (new body)
    with BuildSketch(Plane.XZ.offset(130)):
        Circle(F11_R)
    extrude(amount=F12_DEPTH)


with BuildPart() as f15:
    # F14 (on face) → F15 (new body)
    with BuildSketch(Plane.XZ):
        Circle(F14_R)
        Circle(F14_R_2, mode=Mode.SUBTRACT)
    extrude(amount=-F15_DEPTH)

    # F13 (on Front) → F16 (join)
    with BuildSketch(Plane.XZ):
        Circle(F13_R)
        with Locations((0, -8)):
            Circle(F13_R_2, mode=Mode.SUBTRACT)
        Circle(F13_R_3, mode=Mode.SUBTRACT)
        with Locations((0, 8)):
            Circle(F13_R_2, mode=Mode.SUBTRACT)
    extrude(amount=-F16_DEPTH)


with BuildPart() as f20:
    # F19 (on Right) → F20 (new body)
    with BuildSketch(Plane.YZ):
        with Locations((-44.1039949656, 0)):
            Circle(F19_R)
        with Locations((-44.1039949656, 0)):
            Circle(F19_R_2, mode=Mode.SUBTRACT)
    extrude(amount=-F20_DEPTH)


solid = Compound([f1.part, f3.part, f10.part, f12.part, f15.part, f20.part])
